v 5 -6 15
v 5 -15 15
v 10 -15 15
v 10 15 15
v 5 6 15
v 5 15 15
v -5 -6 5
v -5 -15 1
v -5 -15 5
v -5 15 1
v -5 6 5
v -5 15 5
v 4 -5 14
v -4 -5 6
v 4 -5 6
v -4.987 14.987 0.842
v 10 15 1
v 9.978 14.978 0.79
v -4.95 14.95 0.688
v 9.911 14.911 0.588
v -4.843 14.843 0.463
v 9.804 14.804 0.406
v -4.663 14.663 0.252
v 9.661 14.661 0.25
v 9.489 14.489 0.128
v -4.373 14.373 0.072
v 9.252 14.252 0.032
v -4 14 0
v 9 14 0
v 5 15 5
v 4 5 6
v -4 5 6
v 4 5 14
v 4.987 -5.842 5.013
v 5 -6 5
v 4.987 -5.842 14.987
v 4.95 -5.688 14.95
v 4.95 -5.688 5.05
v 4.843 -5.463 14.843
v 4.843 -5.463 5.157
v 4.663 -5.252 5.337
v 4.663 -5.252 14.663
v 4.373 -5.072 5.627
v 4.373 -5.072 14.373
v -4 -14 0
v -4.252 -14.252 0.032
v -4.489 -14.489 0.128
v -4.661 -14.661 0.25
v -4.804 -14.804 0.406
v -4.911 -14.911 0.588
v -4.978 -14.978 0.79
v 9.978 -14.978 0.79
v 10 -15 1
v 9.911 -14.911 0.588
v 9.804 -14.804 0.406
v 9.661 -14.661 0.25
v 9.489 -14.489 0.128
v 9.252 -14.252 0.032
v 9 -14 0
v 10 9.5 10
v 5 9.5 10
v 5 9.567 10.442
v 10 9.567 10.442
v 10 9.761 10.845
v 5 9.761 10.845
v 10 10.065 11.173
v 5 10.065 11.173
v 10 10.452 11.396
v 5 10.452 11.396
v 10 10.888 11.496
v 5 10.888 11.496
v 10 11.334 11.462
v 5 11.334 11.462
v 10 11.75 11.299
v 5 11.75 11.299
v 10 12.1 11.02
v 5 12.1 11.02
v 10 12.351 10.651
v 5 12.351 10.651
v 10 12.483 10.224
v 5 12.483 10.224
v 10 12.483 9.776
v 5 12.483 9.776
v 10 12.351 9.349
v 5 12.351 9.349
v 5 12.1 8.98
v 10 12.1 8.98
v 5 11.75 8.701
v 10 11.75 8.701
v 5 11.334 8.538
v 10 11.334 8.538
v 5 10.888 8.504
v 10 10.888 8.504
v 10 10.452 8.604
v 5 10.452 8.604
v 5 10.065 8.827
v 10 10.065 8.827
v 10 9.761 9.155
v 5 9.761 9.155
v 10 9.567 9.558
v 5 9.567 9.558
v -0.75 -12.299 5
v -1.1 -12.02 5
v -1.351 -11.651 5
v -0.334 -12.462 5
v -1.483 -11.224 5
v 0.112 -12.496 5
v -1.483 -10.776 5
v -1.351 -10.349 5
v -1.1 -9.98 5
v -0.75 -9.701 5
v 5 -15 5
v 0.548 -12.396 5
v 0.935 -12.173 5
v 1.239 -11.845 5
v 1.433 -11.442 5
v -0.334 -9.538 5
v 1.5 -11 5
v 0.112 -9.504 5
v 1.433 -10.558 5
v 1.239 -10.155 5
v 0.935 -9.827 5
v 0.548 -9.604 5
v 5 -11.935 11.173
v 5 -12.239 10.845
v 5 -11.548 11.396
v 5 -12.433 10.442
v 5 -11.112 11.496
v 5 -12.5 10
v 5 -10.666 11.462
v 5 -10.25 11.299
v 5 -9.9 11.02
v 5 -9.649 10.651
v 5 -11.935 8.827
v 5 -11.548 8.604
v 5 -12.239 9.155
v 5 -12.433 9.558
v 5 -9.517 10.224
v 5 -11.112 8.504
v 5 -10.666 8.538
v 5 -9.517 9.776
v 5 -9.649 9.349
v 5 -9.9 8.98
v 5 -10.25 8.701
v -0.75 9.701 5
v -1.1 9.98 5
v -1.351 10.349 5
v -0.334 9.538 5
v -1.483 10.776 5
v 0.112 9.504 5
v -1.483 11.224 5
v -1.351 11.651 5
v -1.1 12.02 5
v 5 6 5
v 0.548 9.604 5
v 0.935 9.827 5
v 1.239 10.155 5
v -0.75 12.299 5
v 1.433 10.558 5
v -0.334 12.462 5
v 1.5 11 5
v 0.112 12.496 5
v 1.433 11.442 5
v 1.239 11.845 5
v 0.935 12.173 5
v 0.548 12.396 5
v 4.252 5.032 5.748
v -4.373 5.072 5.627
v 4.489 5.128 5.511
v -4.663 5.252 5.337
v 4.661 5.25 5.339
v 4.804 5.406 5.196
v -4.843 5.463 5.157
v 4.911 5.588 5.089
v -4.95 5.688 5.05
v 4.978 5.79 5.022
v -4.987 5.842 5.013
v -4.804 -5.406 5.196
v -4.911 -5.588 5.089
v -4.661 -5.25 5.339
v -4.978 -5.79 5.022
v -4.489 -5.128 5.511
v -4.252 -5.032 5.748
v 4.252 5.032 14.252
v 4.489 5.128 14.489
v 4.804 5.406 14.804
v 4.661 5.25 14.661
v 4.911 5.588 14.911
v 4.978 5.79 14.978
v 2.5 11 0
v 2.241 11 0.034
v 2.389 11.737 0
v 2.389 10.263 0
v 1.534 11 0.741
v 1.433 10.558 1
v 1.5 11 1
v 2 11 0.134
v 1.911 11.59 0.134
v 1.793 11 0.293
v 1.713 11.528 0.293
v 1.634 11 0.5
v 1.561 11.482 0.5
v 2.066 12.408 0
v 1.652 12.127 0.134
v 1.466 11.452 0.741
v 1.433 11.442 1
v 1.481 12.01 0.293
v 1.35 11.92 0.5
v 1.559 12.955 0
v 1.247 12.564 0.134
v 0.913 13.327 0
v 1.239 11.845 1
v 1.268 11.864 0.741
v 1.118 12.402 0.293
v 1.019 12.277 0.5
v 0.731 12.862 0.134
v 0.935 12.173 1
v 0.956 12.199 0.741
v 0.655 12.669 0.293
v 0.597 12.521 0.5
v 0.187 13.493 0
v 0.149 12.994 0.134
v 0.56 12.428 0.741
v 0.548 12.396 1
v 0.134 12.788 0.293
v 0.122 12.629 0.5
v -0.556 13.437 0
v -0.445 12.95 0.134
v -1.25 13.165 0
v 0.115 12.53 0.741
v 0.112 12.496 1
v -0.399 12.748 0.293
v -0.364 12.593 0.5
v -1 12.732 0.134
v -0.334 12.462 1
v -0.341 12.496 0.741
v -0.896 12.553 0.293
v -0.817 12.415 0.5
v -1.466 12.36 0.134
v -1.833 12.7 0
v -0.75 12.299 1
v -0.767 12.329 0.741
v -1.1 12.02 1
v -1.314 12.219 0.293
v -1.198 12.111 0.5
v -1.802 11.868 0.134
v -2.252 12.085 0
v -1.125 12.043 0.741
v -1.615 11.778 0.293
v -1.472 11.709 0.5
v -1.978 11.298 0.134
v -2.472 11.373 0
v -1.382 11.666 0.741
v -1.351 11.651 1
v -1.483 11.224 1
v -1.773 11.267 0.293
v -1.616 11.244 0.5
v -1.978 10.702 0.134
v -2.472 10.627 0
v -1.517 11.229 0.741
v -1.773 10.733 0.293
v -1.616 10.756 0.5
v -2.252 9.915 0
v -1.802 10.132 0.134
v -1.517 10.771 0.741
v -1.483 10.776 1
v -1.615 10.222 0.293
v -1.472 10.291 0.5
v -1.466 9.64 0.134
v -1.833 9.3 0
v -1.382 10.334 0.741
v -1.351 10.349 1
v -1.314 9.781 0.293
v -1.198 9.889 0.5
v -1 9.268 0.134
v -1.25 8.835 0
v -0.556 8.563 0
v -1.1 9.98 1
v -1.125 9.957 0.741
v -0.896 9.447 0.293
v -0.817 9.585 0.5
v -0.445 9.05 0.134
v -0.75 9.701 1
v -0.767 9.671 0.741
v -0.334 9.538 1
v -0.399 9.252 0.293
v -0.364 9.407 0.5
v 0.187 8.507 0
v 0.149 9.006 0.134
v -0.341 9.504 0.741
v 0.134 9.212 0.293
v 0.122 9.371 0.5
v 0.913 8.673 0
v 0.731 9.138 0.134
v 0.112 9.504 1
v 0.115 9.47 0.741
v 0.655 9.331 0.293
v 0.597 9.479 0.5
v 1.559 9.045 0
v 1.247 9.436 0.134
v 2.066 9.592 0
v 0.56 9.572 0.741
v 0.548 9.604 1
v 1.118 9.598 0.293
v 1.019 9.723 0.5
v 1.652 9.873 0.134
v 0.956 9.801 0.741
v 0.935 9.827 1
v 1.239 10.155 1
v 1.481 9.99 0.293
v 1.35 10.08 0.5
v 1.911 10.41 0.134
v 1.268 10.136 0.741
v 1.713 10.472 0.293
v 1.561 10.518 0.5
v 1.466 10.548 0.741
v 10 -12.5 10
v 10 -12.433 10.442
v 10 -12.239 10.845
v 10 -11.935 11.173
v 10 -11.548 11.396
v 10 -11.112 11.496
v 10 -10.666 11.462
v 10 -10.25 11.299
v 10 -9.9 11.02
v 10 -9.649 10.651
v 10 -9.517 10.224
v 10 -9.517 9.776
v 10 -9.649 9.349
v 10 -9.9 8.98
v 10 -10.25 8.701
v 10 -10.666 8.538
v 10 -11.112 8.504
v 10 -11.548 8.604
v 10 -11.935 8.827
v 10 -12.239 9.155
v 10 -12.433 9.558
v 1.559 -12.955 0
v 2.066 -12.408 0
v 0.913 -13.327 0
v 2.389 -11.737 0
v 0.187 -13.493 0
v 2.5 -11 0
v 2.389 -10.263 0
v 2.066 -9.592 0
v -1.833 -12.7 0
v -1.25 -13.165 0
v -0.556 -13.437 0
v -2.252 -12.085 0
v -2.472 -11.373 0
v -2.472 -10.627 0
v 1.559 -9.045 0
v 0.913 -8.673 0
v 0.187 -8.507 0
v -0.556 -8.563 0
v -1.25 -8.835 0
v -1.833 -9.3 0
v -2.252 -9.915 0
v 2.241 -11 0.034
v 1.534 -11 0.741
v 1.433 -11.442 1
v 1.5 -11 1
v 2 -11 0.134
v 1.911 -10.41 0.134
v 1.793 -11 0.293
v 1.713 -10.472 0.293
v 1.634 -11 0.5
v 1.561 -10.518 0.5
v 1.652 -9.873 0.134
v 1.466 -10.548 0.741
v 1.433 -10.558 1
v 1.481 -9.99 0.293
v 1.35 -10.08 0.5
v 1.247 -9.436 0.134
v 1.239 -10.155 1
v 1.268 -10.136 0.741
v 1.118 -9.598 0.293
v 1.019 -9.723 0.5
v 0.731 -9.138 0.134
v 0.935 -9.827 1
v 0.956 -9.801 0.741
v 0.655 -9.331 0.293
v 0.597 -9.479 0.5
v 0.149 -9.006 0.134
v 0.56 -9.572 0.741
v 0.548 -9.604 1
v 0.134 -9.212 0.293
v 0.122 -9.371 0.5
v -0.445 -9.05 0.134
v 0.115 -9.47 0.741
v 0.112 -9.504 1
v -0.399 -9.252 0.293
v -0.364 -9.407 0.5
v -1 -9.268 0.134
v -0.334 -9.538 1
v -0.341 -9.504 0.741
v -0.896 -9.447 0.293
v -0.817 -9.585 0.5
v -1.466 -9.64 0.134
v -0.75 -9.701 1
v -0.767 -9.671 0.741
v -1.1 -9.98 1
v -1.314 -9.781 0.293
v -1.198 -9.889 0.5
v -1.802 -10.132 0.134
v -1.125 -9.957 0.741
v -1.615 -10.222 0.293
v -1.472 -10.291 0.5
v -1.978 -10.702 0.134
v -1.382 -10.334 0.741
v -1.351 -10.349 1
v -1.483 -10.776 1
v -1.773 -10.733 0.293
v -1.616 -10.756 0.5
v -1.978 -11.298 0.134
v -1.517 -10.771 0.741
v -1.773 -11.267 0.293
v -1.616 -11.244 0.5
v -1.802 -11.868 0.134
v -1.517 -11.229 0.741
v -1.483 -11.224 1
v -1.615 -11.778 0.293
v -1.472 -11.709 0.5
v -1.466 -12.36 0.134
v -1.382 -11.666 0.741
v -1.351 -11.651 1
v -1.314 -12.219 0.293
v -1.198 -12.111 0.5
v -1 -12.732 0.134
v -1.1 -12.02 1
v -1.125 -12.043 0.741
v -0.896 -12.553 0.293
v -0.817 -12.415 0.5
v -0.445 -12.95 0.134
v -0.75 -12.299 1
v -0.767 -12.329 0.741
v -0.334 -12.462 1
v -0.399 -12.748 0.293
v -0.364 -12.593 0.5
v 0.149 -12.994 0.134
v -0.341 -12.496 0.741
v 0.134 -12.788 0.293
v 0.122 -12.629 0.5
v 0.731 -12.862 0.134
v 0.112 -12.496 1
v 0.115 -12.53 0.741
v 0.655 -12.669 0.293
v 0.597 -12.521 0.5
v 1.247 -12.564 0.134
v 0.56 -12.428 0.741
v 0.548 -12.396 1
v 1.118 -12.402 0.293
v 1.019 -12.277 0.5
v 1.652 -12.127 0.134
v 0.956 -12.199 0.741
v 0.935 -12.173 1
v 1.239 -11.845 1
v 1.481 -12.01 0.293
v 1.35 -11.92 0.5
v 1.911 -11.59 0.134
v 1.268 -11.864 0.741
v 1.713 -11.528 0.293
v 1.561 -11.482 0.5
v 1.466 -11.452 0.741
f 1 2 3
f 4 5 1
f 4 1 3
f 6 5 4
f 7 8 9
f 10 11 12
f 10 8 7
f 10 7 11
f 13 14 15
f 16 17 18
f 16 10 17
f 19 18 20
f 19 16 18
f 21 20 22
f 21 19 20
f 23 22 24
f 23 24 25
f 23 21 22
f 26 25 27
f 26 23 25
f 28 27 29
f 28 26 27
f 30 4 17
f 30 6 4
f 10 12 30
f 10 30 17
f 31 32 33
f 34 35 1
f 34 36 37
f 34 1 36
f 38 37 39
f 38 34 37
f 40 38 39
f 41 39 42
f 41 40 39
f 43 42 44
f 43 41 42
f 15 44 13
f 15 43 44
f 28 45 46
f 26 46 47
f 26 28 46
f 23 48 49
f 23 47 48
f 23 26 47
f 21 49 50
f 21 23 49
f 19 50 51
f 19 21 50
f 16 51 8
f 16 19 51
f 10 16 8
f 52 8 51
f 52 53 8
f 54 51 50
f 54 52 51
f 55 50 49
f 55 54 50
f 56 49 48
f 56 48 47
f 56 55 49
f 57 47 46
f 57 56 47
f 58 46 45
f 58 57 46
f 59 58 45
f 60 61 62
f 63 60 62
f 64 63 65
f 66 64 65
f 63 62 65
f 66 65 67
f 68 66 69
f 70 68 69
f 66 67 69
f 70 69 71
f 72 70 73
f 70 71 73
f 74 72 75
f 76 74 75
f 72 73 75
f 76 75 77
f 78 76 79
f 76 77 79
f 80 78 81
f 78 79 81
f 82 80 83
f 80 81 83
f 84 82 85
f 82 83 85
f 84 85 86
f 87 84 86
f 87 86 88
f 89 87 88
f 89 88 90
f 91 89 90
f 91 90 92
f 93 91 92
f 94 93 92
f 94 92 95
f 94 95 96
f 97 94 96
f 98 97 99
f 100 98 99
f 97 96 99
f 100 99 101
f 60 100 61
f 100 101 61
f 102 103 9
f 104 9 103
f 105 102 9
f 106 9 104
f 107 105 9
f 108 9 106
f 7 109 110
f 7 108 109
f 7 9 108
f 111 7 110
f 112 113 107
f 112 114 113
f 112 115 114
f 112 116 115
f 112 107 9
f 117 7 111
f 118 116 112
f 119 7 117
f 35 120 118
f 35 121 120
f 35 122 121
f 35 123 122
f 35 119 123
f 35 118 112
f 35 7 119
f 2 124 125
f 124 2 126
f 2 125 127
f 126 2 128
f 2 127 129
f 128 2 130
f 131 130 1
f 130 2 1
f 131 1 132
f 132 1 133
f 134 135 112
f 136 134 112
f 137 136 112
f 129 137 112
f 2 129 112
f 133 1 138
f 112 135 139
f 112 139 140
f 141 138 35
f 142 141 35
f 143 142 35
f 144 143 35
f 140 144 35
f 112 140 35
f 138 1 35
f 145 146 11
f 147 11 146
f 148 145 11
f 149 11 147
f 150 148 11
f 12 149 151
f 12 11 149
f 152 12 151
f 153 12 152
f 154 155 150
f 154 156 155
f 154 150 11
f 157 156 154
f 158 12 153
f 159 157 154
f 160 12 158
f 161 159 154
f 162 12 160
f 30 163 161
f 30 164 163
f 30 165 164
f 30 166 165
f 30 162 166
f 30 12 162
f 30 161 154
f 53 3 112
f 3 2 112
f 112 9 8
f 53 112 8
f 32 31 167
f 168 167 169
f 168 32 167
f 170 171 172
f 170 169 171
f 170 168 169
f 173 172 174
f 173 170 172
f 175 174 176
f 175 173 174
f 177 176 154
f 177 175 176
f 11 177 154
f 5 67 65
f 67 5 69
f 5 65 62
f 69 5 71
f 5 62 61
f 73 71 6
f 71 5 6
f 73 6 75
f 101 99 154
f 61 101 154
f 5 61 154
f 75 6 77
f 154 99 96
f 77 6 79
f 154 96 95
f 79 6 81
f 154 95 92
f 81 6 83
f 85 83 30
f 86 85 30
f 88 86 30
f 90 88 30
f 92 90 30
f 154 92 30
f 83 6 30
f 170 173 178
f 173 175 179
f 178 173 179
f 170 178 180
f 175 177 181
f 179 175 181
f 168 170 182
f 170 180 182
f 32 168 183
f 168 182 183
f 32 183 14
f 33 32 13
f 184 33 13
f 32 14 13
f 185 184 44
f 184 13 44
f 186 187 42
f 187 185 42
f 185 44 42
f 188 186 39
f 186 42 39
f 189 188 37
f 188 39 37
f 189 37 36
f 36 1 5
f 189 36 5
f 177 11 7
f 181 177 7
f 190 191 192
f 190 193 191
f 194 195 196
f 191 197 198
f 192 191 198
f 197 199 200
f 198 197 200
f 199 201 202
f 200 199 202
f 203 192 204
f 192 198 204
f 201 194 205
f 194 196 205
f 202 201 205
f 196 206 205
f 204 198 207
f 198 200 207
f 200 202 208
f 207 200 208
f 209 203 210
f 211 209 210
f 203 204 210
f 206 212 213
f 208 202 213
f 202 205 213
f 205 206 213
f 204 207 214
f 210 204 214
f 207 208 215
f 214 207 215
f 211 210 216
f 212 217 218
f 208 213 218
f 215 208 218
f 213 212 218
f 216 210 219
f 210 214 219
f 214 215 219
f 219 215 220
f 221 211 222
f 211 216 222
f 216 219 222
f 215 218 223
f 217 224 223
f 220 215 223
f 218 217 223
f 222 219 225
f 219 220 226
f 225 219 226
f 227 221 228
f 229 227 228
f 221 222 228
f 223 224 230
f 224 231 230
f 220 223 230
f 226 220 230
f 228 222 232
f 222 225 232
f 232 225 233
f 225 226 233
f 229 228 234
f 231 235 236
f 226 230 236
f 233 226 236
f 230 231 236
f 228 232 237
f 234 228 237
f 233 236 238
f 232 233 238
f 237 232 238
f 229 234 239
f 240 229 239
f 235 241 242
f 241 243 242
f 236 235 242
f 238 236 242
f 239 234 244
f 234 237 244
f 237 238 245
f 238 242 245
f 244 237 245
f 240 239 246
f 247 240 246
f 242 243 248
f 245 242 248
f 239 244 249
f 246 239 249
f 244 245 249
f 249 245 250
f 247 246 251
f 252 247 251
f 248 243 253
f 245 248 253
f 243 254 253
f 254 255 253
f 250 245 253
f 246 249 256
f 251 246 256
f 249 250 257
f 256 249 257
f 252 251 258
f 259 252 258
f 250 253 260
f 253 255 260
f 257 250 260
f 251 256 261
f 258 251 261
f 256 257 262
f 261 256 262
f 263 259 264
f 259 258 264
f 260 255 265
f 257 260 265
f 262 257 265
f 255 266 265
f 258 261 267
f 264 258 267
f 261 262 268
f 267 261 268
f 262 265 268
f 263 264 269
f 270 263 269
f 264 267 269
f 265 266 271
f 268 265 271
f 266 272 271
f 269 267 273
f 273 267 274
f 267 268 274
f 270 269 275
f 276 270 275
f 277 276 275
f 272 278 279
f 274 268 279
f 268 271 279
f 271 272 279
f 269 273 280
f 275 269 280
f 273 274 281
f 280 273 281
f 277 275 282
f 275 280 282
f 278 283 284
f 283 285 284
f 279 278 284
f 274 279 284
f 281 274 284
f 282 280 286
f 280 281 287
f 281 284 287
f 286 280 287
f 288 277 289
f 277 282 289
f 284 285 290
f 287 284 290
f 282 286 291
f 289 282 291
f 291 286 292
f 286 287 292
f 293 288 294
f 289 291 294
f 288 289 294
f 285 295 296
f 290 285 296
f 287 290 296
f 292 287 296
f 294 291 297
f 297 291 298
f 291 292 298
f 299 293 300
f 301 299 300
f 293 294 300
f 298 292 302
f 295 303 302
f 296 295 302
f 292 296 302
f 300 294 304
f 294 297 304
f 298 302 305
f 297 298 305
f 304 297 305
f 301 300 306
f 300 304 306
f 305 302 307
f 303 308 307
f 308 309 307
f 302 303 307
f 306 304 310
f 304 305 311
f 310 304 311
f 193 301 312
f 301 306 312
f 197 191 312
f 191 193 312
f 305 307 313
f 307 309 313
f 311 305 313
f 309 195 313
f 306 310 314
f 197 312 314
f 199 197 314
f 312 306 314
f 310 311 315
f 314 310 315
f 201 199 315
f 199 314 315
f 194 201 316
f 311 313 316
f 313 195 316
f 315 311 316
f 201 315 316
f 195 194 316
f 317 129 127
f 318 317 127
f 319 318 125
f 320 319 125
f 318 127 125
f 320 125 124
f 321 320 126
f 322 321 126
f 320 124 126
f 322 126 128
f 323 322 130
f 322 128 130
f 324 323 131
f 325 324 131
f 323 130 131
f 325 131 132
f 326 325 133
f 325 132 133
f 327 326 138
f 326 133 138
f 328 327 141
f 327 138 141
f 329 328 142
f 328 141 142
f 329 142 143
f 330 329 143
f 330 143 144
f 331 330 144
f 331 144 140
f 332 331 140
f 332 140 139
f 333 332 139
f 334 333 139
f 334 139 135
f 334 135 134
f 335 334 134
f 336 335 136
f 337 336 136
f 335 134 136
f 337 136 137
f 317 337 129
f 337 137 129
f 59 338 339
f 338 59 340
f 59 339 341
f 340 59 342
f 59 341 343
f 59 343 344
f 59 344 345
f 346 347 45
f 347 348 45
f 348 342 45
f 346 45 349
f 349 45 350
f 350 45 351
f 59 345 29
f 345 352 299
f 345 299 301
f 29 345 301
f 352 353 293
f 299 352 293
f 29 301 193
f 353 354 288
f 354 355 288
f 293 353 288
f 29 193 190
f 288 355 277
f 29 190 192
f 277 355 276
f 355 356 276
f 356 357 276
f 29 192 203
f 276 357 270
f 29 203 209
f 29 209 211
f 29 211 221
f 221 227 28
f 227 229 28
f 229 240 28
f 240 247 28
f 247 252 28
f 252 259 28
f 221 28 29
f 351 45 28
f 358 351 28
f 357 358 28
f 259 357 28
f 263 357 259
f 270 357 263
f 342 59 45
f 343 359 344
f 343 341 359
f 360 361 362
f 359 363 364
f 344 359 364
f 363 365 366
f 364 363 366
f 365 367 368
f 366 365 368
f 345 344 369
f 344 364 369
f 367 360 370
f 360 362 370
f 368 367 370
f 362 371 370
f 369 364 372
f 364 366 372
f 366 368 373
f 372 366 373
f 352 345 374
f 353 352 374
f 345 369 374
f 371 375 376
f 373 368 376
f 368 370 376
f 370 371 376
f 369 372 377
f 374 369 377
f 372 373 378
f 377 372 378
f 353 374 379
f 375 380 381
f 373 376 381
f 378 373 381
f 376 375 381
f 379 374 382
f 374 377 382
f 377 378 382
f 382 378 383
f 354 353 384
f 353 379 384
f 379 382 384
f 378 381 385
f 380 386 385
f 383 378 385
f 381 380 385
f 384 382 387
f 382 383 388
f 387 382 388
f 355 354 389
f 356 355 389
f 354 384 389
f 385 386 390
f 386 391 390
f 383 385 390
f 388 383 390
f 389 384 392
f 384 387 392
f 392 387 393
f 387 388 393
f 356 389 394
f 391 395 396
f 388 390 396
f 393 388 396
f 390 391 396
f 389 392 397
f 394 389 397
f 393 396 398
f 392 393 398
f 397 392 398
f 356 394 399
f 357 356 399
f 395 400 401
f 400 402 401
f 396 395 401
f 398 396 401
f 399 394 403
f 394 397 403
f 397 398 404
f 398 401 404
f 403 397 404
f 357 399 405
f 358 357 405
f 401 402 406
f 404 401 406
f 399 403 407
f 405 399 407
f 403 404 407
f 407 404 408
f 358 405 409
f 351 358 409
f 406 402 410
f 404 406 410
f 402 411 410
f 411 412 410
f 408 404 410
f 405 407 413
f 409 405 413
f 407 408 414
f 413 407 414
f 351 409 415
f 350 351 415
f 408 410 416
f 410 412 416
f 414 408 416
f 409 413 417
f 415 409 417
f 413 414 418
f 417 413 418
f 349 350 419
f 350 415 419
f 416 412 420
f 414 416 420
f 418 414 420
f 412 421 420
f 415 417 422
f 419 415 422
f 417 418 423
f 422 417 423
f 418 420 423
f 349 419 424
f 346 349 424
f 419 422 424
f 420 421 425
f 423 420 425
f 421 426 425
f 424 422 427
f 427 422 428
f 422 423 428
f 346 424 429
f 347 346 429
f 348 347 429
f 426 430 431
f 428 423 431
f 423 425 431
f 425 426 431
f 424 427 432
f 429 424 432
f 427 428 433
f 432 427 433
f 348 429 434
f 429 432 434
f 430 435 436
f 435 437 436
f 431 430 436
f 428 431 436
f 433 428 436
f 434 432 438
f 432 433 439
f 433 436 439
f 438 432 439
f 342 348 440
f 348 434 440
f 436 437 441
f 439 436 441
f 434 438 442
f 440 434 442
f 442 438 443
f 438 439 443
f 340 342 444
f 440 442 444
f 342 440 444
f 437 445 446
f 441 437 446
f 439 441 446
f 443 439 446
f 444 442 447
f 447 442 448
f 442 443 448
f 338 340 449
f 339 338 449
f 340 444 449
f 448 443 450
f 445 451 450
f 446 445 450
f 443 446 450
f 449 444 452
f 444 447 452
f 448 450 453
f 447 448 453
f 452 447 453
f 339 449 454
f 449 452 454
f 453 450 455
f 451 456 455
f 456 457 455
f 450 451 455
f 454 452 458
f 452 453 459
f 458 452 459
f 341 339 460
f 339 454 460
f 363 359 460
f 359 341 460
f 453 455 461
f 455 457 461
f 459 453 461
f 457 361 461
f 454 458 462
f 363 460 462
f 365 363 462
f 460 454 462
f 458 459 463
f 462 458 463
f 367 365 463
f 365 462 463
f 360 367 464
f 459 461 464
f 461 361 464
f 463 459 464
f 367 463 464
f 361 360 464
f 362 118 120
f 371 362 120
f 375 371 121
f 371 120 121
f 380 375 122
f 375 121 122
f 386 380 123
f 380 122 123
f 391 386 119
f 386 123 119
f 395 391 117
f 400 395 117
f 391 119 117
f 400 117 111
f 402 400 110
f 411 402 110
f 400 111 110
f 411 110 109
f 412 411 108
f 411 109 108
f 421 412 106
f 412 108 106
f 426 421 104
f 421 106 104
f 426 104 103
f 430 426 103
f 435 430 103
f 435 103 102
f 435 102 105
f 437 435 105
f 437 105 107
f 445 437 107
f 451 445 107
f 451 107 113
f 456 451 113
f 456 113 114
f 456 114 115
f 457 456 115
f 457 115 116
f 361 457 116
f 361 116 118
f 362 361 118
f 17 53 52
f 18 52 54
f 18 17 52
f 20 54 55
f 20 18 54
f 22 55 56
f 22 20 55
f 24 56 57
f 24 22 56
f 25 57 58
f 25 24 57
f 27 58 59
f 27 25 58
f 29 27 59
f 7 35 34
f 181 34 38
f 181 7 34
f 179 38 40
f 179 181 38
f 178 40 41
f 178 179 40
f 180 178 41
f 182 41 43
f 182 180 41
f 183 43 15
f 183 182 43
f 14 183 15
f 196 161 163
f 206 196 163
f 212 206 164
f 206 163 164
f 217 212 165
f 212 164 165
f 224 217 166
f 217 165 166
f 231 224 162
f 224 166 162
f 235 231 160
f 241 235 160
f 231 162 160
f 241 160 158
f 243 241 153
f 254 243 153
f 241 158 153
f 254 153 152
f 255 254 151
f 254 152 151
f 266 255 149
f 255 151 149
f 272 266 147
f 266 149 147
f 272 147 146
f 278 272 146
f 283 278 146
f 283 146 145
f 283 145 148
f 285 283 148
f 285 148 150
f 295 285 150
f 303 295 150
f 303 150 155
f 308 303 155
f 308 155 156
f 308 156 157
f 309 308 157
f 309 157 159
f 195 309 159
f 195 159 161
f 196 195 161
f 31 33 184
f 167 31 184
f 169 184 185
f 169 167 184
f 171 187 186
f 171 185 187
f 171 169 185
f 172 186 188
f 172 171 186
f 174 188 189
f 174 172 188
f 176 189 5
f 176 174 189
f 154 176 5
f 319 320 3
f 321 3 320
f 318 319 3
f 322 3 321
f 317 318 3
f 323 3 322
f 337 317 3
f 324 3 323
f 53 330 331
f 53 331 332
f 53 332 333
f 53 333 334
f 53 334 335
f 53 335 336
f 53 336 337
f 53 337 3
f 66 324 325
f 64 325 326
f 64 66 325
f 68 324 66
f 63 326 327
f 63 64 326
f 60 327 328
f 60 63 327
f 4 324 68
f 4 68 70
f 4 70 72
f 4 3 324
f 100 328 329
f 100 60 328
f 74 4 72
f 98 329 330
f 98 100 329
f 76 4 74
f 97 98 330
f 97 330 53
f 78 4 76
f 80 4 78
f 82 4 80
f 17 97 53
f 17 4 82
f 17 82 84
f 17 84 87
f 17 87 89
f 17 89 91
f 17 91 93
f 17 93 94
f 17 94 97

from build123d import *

# Parameters (mm, degrees)
SKETCH_1_W           = 10
SKETCH_1_H           = 30
EXTRUDE_1_DEPTH      = 5
SKETCH_2_W           = 15
SKETCH_2_H           = 30
EXTRUDE_2_DEPTH      = 5
SKETCH_4_R           = 1.5
CUT_EXTRUDE_1_DEPTH  = 21.615528128
EXTRUDE_3_DEPTH      = 5
EXTRUDE_3_DEPTH_BACK = 5
SKETCH_3_R           = 1.5
CUT_EXTRUDE_2_DEPTH  = 5
FILLET_1_R           = 1
FILLET_2_R           = 1


with BuildPart() as part:
    # 草圖1 → 填料-伸長1 (new body)
    with BuildSketch(Plane.XY):
        Rectangle(SKETCH_1_W, SKETCH_1_H)
    extrude(amount=EXTRUDE_1_DEPTH)

    # 草圖2 → 填料-伸長2 (add)
    with BuildSketch(Plane(origin=(5, 0, 0), x_dir=(0, 0, -1), z_dir=(1, 0, 0))):
        with Locations((-7.5, 0)):
            Rectangle(SKETCH_2_W, SKETCH_2_H)
    extrude(amount=EXTRUDE_2_DEPTH)

    # 草圖4 → 除料-伸長1 (cut, through all)
    with BuildSketch(Plane.XY.offset(5)):
        with Locations((0, 11)):
            Circle(SKETCH_4_R)
        with Locations((0, -11)):
            Circle(SKETCH_4_R)
    extrude(amount=-CUT_EXTRUDE_1_DEPTH, mode=Mode.SUBTRACT)

    # 草圖5 → 填料-伸長3 (add, two sides: drawn at the far end of the back side and taken through both)
    with BuildSketch(Plane.XZ.offset(-EXTRUDE_3_DEPTH_BACK)):
        Polygon((5, 15), (-5, 5), (5, 5), align=None)
    extrude(amount=EXTRUDE_3_DEPTH + EXTRUDE_3_DEPTH_BACK)

    # 草圖3 → 除料-伸長2 (cut)
    with BuildSketch(Plane.ZY.offset(-5)):
        with Locations(Location((10, 11, 0), (0, 0, 270))):
            Circle(SKETCH_3_R)
        with Locations(Location((10, -11, 0), (0, 0, 270))):
            Circle(SKETCH_3_R)
    extrude(amount=-CUT_EXTRUDE_2_DEPTH, mode=Mode.SUBTRACT)

    # 圓角1
    fillet_1_edges = [part.edges().sort_by_distance(p)[0] for p in [
        (10, 0, 0),
        (-1.5, 11, 0),
        (-1.5, -11, 0),
        (2.5, -15, 0),
        (-5, 0, 0),
        (2.5, 15, 0),
    ]]
    fillet(fillet_1_edges, radius=FILLET_1_R)

    # 圓角2
    # the kernel refuses this fillet: 1 mm, written as the material it adds along each edge
    with BuildSketch(Plane(origin=(-5, -5, 5), x_dir=(0, -1, 0), z_dir=(1, 0, 0))) as fillet_2_piece_1_section:
        with BuildLine():
            CenterArc((FILLET_2_R, -FILLET_2_R), FILLET_2_R, 90, 90)
            Line((0, -FILLET_2_R), (0, 0))
            Line((0, 0), (FILLET_2_R, 0))
        make_face()
    fillet_2_piece_1 = extrude(amount=12.5, mode=Mode.PRIVATE)
    fillet_2_piece_1 = split(fillet_2_piece_1, bisect_by=Plane(origin=(-2.333551082, -5.229183037, 7.666448918), z_dir=(0.7071067811865476, 0, -0.7071067811865475)), keep=Keep.TOP, mode=Mode.PRIVATE)
    add(fillet_2_piece_1)
    with BuildSketch(Plane(origin=(5, -5, 2.5), x_dir=(0, -1, 0), z_dir=(0, 0, 1))) as fillet_2_piece_2_section:
        with BuildLine():
            CenterArc((FILLET_2_R, -FILLET_2_R), FILLET_2_R, 90, 90)
            Line((0, -FILLET_2_R), (0, 0))
            Line((0, 0), (FILLET_2_R, 0))
        make_face()
    fillet_2_piece_2 = extrude(amount=12.5, mode=Mode.PRIVATE)
    fillet_2_piece_2 = split(fillet_2_piece_2, bisect_by=Plane(origin=(-0.738197557, -5.226395114, 9.261802443), z_dir=(0.7071067811865476, 0, -0.7071067811865475)), keep=Keep.TOP, mode=Mode.PRIVATE)
    add(fillet_2_piece_2)
    with BuildSketch(Plane(origin=(-5, 5, 5), x_dir=(0, 1, 0), z_dir=(1, 0, 0))) as fillet_2_piece_3_section:
        with BuildLine():
            CenterArc((FILLET_2_R, FILLET_2_R), FILLET_2_R, 180, 90)
            Line((0, FILLET_2_R), (0, 0))
            Line((0, 0), (FILLET_2_R, 0))
        make_face()
    fillet_2_piece_3 = extrude(amount=12.5, mode=Mode.PRIVATE)
    fillet_2_piece_3 = split(fillet_2_piece_3, bisect_by=Plane(origin=(-2.333551082, 5.229183037, 7.666448918), z_dir=(0.7071067811865476, 0, -0.7071067811865475)), keep=Keep.TOP, mode=Mode.PRIVATE)
    add(fillet_2_piece_3)
    with BuildSketch(Plane(origin=(5, 5, 2.5), x_dir=(0, 1, 0), z_dir=(0, 0, 1))) as fillet_2_piece_4_section:
        with BuildLine():
            CenterArc((FILLET_2_R, FILLET_2_R), FILLET_2_R, 180, 90)
            Line((0, FILLET_2_R), (0, 0))
            Line((0, 0), (FILLET_2_R, 0))
        make_face()
    fillet_2_piece_4 = extrude(amount=12.5, mode=Mode.PRIVATE)
    fillet_2_piece_4 = split(fillet_2_piece_4, bisect_by=Plane(origin=(-0.738197557, 5.226395114, 9.261802443), z_dir=(0.7071067811865476, 0, -0.7071067811865475)), keep=Keep.TOP, mode=Mode.PRIVATE)
    add(fillet_2_piece_4)


solid = part.part
